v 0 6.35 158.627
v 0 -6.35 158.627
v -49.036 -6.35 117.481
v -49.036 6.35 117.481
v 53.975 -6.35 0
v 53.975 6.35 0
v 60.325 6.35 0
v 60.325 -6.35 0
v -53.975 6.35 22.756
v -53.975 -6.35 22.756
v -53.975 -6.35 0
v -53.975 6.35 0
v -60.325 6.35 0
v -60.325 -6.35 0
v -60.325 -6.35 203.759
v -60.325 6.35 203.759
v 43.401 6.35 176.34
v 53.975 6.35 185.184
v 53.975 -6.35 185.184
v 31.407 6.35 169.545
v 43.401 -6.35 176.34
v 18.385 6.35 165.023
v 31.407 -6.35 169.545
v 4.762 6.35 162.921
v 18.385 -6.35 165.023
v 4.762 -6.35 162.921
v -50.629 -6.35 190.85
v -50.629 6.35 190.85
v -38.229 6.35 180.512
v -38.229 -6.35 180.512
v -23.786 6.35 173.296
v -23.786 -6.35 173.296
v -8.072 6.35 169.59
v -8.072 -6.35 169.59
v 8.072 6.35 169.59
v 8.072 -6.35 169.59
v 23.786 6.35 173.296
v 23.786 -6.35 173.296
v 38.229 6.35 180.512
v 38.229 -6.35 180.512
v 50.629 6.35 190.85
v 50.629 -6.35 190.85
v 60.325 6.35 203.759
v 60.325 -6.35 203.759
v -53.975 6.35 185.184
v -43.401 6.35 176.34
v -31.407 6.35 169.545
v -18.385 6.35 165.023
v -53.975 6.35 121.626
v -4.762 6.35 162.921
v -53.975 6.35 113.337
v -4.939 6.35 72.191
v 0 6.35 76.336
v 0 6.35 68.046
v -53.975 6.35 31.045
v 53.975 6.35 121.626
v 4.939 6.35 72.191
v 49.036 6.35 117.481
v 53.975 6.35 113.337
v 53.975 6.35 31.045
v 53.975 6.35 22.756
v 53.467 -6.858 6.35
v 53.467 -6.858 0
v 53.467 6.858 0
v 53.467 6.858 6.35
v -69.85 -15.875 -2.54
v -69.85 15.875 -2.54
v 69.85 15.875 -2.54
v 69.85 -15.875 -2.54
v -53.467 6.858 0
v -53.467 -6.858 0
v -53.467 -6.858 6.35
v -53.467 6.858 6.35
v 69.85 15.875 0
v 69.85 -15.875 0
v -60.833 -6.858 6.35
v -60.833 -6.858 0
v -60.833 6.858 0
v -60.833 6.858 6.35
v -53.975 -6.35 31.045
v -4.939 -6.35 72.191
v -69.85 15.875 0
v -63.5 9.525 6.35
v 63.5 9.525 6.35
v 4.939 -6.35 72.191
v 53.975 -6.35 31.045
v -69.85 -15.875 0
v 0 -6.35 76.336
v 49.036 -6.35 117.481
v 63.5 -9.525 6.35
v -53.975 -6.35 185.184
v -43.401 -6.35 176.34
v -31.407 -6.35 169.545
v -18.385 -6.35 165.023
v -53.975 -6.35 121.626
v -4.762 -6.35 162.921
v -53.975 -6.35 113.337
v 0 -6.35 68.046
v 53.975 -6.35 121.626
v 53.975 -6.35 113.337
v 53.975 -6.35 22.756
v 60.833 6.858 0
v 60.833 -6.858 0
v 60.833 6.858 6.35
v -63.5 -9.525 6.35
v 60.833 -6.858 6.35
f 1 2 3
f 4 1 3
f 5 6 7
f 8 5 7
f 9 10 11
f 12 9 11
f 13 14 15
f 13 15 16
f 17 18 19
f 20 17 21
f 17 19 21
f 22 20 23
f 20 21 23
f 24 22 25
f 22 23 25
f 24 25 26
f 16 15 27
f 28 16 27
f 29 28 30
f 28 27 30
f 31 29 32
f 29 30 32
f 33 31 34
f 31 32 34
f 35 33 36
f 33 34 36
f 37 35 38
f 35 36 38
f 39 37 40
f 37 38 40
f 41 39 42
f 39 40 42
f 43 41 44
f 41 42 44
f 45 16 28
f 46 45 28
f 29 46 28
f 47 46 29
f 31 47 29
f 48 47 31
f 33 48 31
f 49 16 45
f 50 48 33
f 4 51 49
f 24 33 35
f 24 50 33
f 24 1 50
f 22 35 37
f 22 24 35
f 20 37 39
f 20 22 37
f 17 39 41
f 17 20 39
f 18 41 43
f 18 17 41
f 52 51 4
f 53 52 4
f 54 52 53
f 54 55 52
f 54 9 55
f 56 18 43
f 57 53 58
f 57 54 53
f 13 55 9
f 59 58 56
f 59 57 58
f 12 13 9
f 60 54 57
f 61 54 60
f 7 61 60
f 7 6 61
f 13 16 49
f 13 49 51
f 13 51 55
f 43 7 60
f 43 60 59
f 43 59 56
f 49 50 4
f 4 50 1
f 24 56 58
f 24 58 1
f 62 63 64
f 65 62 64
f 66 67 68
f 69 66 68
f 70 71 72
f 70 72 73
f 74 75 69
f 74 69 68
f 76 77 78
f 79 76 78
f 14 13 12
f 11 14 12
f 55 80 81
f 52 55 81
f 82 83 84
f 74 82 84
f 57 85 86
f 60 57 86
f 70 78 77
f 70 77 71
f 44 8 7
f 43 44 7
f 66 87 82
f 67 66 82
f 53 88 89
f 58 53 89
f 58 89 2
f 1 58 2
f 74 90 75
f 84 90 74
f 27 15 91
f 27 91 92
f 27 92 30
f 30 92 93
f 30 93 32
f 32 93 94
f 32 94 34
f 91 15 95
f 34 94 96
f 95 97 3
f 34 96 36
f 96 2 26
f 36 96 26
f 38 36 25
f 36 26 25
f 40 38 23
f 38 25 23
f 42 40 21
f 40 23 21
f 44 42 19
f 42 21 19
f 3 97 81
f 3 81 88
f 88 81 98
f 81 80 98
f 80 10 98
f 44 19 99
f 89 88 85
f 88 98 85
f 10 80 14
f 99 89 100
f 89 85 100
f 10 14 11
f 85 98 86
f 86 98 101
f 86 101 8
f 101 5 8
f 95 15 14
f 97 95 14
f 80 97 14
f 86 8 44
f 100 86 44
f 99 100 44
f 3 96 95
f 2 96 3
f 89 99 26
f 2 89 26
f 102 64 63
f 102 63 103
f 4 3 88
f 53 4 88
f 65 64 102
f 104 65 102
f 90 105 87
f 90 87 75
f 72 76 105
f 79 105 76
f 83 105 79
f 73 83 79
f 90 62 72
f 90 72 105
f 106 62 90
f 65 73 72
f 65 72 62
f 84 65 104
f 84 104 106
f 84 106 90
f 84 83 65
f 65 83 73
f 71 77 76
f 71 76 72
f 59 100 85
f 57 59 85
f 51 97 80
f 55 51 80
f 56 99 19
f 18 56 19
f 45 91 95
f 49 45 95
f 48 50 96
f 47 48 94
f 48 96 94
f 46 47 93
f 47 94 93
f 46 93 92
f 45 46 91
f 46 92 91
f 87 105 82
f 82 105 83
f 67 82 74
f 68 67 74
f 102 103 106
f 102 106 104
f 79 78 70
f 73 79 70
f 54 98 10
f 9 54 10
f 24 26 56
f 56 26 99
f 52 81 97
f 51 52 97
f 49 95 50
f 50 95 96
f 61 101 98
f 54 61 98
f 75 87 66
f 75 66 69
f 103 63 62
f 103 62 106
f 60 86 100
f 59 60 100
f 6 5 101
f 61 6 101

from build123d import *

# Parameters (mm, degrees)
F0_W          = 120.65
F0_H          = 12.7
F1_DEPTH      = 228.6
F3_DEPTH      = 25.4
F3_DEPTH_BACK = 25.4
F4_W          = 139.7
F4_H          = 31.75
F4_W_2        = 7.366
F4_H_2        = 13.716
F5_DEPTH      = 6.35
F6_SIZE       = 6.34999
F7_DEPTH      = 2.54


# Not quite as in the source:
# - a fillet or chamfer is up to 0.001 mm smaller than in the source, because OpenCascade refuses the exact size


with BuildPart() as f1:
    # F0 (on Top) → F1 (new body)
    with BuildSketch(Plane.XY):
        Rectangle(F0_W, F0_H)
    extrude(amount=F1_DEPTH)

    # F2 (on Front) → F3 (cut, two sides)
    with BuildSketch(Plane.XZ) as f3_sk:
        with BuildLine():
            ThreePointArc((60.325, 203.7592132588), (67.4267148466, 220.7326802639), (69.85, 238.9716666667))
            ThreePointArc((69.85, 238.9716666667), (-18.2389864028, 306.3983815132), (-60.325, 203.7592132588))
            ThreePointArc((-60.325, 203.7592132588), (0, 169.1216666667), (60.325, 203.7592132588))
        make_face()
        with BuildLine():
            ThreePointArc((-4.7619259855, 162.9206044722), (-31.407301592, 169.5452926672), (-53.975, 185.1837556178))
            Line((-53.975, 185.1837556178), (-53.975, 121.6259322175))
            Line((-53.975, 121.6259322175), (-4.7619259855, 162.9206044722))
        make_face()
        with BuildLine():
            Line((53.975, 121.6259322175), (53.975, 185.1837556178))
            ThreePointArc((53.975, 185.1837556178), (31.407301592, 169.5452926672), (4.7619259855, 162.9206044722))
            Line((4.7619259855, 162.9206044722), (53.975, 121.6259322175))
        make_face()
        Polygon((0, 158.626998523), (-49.0355768497, 117.4812640739), (0, 76.3355296247), (49.0355768497, 117.4812640739), align=None)
        Polygon((-4.9394231503, 72.1908614811), (-53.975, 113.3365959302), (-53.975, 31.0451270319), align=None)
        Polygon((53.975, 31.0451270319), (53.975, 113.3365959302), (4.9394231503, 72.1908614811), align=None)
        Polygon((-53.975, 22.7557907447), (-53.975, 0), (53.975, 0), (53.975, 22.7557907447), (0, 68.0461933374), align=None)
    extrude(amount=-F3_DEPTH, mode=Mode.SUBTRACT)
    extrude(f3_sk.sketch, amount=F3_DEPTH_BACK, mode=Mode.SUBTRACT)


with BuildPart() as f5:
    # F4 (on Top) → F5 (new body)
    with BuildSketch(Plane.XY):
        Rectangle(F4_W, F4_H)
        with Locations((-57.15, 0)):
            Rectangle(F4_W_2, F4_H_2, mode=Mode.SUBTRACT)
        with Locations((57.15, 0)):
            Rectangle(F4_W_2, F4_H_2, mode=Mode.SUBTRACT)
    extrude(amount=F5_DEPTH)

    # F6 (size 6.35 in the source; OpenCascade refuses exactly that, so slightly less here)
    f6_edges = [f5.edges().sort_by_distance(p)[0] for p in [
        (0, -15.875, 6.35),
        (-69.85, 0, 6.35),
        (0, 15.875, 6.35),
        (69.85, 0, 6.35),
    ]]
    chamfer(f6_edges, length=F6_SIZE)

    # F4 (on Top) → F7 (join)
    with BuildSketch(Plane.XY):
        Rectangle(F4_W, F4_H)
        with Locations((-57.15, 0)):
            Rectangle(F4_W_2, F4_H_2, mode=Mode.SUBTRACT)
        with Locations((57.15, 0)):
            Rectangle(F4_W_2, F4_H_2, mode=Mode.SUBTRACT)
        with Locations((-57.15, 0)):
            Rectangle(F4_W_2, F4_H_2)
        with Locations((57.15, 0)):
            Rectangle(F4_W_2, F4_H_2)
    extrude(amount=-F7_DEPTH)


solid = Compound([f1.part, f5.part])
